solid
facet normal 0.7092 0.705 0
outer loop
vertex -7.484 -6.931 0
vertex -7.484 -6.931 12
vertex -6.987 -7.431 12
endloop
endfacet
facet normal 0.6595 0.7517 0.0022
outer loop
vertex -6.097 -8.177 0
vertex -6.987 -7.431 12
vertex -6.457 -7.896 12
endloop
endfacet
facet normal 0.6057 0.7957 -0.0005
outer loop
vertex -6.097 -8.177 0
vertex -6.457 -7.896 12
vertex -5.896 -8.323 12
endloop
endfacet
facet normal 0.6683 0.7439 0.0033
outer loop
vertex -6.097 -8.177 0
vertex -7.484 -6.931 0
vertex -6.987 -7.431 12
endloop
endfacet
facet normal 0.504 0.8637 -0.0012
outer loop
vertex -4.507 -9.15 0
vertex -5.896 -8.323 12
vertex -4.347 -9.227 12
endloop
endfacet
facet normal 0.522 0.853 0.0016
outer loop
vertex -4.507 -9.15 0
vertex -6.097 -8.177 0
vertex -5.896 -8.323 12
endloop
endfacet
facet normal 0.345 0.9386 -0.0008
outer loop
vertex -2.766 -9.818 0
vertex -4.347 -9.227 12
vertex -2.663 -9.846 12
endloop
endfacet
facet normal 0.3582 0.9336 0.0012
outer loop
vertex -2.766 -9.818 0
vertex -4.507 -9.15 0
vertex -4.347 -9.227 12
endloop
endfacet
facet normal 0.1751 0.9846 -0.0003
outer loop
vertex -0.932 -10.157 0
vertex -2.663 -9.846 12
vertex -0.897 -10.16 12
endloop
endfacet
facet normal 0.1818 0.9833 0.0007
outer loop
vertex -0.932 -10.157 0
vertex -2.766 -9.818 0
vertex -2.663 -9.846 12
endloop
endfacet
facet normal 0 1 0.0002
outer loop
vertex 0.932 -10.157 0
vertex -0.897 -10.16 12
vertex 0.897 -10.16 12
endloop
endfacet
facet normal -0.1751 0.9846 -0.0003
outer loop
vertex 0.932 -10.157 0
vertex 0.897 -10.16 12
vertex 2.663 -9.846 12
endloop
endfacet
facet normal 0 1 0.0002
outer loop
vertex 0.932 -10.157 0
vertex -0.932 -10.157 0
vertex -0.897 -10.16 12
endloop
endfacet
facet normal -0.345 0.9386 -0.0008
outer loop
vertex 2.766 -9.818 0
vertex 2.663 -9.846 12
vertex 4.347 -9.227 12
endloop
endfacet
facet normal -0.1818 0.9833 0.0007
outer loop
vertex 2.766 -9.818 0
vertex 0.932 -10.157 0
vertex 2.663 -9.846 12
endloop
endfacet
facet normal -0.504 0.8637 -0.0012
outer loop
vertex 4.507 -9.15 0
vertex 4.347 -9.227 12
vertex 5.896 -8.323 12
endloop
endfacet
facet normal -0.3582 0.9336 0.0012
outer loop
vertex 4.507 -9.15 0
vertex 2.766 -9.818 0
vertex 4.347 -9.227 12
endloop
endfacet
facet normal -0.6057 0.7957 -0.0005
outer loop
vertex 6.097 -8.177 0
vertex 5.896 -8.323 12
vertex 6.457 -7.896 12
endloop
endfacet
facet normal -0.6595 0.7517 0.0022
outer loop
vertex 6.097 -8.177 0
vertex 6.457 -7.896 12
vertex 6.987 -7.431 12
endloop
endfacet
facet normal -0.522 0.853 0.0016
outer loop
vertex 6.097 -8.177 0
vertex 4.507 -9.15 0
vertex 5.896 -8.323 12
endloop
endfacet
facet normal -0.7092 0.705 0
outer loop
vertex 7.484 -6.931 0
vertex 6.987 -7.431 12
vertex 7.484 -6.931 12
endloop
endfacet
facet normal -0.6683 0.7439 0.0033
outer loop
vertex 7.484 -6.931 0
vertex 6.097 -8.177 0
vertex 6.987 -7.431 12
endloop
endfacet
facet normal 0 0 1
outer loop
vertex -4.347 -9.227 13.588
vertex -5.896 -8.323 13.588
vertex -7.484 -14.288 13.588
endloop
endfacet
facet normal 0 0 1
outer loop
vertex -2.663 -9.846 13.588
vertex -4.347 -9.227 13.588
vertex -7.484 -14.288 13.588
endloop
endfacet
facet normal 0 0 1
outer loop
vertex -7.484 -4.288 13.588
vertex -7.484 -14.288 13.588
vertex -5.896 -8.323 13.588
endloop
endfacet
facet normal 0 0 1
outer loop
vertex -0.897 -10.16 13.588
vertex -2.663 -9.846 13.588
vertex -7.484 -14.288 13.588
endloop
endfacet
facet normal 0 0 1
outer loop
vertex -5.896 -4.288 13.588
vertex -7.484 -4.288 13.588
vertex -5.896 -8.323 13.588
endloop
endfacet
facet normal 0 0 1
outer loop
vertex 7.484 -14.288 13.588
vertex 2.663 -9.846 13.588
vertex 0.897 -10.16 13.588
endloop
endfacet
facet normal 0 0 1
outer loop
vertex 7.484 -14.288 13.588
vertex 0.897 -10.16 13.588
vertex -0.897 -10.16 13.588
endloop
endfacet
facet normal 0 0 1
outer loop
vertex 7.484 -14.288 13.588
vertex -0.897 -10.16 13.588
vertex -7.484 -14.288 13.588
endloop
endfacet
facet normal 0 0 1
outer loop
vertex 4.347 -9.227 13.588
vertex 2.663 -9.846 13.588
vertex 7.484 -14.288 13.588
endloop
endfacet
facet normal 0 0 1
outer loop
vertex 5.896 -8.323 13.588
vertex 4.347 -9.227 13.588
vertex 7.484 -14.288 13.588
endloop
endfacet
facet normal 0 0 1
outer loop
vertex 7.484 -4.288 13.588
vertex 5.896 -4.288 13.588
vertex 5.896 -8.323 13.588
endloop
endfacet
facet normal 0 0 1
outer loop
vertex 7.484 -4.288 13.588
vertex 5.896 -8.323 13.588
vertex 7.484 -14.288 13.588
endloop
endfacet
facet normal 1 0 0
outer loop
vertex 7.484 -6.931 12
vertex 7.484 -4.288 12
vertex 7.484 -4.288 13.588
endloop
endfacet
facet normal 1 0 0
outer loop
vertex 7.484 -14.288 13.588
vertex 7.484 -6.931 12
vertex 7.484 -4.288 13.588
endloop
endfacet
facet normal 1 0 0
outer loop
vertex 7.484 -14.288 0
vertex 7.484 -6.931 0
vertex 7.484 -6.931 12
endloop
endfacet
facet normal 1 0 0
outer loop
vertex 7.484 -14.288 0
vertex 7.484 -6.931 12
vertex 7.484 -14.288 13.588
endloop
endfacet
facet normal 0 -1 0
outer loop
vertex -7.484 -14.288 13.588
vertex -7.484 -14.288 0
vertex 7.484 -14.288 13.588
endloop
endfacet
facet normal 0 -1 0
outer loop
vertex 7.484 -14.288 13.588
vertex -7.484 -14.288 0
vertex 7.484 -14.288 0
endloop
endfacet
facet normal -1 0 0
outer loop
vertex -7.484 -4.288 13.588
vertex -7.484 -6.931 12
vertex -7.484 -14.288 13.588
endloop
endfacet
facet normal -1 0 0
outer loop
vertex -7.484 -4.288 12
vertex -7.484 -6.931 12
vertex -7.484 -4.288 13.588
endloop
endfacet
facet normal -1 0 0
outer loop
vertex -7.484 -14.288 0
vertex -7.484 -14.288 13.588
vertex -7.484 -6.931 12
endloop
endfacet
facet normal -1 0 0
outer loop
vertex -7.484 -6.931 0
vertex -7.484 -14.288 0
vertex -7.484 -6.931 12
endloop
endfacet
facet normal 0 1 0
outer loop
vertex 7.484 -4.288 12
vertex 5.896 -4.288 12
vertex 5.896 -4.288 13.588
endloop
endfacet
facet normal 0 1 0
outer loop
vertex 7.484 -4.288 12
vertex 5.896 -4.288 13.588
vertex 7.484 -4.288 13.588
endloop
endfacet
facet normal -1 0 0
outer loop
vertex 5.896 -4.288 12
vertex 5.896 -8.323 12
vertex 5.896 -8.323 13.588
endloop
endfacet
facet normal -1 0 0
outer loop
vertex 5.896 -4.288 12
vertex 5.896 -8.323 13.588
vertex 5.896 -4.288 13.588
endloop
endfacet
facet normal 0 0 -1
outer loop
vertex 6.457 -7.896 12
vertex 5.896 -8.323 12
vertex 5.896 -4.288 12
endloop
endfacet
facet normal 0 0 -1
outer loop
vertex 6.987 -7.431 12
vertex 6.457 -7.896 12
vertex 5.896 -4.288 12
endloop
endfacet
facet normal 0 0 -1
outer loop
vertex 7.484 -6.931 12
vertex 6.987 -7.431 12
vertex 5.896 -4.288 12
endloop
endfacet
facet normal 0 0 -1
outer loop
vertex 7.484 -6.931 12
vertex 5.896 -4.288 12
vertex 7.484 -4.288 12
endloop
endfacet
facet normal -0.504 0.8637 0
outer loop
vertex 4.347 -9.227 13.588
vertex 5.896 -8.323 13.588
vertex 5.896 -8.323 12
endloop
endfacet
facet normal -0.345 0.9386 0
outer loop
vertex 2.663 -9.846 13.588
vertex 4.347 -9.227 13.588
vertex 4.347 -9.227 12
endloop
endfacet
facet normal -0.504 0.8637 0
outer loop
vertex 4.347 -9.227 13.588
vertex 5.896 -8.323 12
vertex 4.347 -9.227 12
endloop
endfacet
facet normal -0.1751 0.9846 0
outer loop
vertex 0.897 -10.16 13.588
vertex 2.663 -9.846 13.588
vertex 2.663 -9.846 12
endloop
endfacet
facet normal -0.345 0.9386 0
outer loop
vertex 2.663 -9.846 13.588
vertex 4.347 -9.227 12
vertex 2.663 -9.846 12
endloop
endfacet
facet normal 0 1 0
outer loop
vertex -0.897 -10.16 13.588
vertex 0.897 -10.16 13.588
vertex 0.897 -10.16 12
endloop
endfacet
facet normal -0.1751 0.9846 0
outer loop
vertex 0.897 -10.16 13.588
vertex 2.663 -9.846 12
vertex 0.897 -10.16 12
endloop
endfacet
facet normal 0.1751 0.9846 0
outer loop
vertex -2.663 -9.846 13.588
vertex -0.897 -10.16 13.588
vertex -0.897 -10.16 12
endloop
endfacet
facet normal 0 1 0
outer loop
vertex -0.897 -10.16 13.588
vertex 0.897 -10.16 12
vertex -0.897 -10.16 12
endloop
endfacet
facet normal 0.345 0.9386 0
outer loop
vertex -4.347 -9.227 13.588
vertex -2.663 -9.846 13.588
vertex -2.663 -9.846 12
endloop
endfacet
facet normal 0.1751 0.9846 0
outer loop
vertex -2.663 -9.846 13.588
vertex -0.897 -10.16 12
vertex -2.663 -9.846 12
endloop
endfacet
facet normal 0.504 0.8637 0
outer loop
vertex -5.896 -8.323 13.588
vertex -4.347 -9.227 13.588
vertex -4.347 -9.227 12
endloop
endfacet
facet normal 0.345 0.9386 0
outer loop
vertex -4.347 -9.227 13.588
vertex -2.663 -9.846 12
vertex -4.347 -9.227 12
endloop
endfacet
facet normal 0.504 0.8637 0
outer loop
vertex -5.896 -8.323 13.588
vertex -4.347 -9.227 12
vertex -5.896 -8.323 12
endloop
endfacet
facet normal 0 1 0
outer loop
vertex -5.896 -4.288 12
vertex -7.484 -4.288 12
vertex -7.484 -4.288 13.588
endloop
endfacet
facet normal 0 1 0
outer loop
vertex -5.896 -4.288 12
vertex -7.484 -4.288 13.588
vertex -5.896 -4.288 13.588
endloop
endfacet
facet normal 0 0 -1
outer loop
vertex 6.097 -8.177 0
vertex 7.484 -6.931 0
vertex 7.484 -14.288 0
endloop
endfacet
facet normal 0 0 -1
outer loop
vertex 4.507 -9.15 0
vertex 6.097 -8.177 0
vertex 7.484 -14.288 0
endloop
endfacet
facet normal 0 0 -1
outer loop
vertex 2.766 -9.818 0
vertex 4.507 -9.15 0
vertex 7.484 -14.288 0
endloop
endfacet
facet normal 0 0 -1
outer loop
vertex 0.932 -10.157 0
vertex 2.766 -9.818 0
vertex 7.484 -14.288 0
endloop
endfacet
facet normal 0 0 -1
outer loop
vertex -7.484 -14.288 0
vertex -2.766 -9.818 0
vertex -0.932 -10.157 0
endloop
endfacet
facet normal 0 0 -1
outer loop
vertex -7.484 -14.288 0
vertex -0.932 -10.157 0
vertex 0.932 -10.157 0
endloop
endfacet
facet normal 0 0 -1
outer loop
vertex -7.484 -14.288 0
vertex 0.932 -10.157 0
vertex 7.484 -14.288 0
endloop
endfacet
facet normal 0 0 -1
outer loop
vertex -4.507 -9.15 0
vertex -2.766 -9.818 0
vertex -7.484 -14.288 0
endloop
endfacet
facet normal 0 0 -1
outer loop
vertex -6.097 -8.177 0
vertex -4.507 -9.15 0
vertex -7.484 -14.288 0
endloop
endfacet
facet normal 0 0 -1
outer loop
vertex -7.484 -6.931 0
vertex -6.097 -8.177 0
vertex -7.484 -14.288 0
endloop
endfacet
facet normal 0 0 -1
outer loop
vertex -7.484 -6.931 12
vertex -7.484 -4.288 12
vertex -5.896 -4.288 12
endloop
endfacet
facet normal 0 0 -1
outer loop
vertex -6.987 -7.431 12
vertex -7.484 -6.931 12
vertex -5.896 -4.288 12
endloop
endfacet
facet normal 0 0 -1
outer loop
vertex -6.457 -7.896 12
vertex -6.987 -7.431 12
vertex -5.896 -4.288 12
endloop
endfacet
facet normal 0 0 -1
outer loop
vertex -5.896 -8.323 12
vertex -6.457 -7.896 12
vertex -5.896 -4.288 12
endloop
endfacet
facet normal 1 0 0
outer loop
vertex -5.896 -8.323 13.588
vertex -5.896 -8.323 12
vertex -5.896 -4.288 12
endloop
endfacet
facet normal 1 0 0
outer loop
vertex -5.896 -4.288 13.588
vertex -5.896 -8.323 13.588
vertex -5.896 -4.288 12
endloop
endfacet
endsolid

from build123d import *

# Parameters (mm, degrees)
BOSS_EXTRUDE1_DEPTH = 12
SKETCH3_W           = 1.5875
SKETCH3_H           = 10
BOSS_EXTRUDE2_DEPTH = 1.5875
BOSS_EXTRUDE3_DEPTH = 1.5875


with BuildPart() as part:
    # Sketch2 → Boss-Extrude1 (new body)
    with BuildSketch(Plane.XY):
        with BuildLine():
            ThreePointArc((-7.4837, -6.930673438), (0, -10.2), (7.4837, -6.930673438))
            Line((7.4837, -6.930673438), (7.4837, -14.2875))
            Line((7.4837, -14.2875), (-7.4837, -14.2875))
            Line((-7.4837, -14.2875), (-7.4837, -6.930673438))
        make_face()
    extrude(amount=BOSS_EXTRUDE1_DEPTH)

    # Sketch3 → Boss-Extrude2 (add)
    with BuildSketch(Plane.XY.offset(12)):
        with Locations((-6.68995, -9.2875)):
            Rectangle(SKETCH3_W, SKETCH3_H)
        with Locations((6.68995, -9.2875)):
            Rectangle(SKETCH3_W, SKETCH3_H)
    extrude(amount=BOSS_EXTRUDE2_DEPTH)

    # Sketch4 → Boss-Extrude3 (add)
    with BuildSketch(Plane.XY.offset(12)):
        with BuildLine():
            Line((-5.8962, -8.323149978), (-5.8962, -14.2875))
            Line((-5.8962, -14.2875), (5.8962, -14.2875))
            Line((5.8962, -14.2875), (5.8962, -8.323149978))
            ThreePointArc((5.8962, -8.323149978), (0, -10.2), (-5.8962, -8.323149978))
        make_face()
    extrude(amount=BOSS_EXTRUDE3_DEPTH)


solid = part.part
